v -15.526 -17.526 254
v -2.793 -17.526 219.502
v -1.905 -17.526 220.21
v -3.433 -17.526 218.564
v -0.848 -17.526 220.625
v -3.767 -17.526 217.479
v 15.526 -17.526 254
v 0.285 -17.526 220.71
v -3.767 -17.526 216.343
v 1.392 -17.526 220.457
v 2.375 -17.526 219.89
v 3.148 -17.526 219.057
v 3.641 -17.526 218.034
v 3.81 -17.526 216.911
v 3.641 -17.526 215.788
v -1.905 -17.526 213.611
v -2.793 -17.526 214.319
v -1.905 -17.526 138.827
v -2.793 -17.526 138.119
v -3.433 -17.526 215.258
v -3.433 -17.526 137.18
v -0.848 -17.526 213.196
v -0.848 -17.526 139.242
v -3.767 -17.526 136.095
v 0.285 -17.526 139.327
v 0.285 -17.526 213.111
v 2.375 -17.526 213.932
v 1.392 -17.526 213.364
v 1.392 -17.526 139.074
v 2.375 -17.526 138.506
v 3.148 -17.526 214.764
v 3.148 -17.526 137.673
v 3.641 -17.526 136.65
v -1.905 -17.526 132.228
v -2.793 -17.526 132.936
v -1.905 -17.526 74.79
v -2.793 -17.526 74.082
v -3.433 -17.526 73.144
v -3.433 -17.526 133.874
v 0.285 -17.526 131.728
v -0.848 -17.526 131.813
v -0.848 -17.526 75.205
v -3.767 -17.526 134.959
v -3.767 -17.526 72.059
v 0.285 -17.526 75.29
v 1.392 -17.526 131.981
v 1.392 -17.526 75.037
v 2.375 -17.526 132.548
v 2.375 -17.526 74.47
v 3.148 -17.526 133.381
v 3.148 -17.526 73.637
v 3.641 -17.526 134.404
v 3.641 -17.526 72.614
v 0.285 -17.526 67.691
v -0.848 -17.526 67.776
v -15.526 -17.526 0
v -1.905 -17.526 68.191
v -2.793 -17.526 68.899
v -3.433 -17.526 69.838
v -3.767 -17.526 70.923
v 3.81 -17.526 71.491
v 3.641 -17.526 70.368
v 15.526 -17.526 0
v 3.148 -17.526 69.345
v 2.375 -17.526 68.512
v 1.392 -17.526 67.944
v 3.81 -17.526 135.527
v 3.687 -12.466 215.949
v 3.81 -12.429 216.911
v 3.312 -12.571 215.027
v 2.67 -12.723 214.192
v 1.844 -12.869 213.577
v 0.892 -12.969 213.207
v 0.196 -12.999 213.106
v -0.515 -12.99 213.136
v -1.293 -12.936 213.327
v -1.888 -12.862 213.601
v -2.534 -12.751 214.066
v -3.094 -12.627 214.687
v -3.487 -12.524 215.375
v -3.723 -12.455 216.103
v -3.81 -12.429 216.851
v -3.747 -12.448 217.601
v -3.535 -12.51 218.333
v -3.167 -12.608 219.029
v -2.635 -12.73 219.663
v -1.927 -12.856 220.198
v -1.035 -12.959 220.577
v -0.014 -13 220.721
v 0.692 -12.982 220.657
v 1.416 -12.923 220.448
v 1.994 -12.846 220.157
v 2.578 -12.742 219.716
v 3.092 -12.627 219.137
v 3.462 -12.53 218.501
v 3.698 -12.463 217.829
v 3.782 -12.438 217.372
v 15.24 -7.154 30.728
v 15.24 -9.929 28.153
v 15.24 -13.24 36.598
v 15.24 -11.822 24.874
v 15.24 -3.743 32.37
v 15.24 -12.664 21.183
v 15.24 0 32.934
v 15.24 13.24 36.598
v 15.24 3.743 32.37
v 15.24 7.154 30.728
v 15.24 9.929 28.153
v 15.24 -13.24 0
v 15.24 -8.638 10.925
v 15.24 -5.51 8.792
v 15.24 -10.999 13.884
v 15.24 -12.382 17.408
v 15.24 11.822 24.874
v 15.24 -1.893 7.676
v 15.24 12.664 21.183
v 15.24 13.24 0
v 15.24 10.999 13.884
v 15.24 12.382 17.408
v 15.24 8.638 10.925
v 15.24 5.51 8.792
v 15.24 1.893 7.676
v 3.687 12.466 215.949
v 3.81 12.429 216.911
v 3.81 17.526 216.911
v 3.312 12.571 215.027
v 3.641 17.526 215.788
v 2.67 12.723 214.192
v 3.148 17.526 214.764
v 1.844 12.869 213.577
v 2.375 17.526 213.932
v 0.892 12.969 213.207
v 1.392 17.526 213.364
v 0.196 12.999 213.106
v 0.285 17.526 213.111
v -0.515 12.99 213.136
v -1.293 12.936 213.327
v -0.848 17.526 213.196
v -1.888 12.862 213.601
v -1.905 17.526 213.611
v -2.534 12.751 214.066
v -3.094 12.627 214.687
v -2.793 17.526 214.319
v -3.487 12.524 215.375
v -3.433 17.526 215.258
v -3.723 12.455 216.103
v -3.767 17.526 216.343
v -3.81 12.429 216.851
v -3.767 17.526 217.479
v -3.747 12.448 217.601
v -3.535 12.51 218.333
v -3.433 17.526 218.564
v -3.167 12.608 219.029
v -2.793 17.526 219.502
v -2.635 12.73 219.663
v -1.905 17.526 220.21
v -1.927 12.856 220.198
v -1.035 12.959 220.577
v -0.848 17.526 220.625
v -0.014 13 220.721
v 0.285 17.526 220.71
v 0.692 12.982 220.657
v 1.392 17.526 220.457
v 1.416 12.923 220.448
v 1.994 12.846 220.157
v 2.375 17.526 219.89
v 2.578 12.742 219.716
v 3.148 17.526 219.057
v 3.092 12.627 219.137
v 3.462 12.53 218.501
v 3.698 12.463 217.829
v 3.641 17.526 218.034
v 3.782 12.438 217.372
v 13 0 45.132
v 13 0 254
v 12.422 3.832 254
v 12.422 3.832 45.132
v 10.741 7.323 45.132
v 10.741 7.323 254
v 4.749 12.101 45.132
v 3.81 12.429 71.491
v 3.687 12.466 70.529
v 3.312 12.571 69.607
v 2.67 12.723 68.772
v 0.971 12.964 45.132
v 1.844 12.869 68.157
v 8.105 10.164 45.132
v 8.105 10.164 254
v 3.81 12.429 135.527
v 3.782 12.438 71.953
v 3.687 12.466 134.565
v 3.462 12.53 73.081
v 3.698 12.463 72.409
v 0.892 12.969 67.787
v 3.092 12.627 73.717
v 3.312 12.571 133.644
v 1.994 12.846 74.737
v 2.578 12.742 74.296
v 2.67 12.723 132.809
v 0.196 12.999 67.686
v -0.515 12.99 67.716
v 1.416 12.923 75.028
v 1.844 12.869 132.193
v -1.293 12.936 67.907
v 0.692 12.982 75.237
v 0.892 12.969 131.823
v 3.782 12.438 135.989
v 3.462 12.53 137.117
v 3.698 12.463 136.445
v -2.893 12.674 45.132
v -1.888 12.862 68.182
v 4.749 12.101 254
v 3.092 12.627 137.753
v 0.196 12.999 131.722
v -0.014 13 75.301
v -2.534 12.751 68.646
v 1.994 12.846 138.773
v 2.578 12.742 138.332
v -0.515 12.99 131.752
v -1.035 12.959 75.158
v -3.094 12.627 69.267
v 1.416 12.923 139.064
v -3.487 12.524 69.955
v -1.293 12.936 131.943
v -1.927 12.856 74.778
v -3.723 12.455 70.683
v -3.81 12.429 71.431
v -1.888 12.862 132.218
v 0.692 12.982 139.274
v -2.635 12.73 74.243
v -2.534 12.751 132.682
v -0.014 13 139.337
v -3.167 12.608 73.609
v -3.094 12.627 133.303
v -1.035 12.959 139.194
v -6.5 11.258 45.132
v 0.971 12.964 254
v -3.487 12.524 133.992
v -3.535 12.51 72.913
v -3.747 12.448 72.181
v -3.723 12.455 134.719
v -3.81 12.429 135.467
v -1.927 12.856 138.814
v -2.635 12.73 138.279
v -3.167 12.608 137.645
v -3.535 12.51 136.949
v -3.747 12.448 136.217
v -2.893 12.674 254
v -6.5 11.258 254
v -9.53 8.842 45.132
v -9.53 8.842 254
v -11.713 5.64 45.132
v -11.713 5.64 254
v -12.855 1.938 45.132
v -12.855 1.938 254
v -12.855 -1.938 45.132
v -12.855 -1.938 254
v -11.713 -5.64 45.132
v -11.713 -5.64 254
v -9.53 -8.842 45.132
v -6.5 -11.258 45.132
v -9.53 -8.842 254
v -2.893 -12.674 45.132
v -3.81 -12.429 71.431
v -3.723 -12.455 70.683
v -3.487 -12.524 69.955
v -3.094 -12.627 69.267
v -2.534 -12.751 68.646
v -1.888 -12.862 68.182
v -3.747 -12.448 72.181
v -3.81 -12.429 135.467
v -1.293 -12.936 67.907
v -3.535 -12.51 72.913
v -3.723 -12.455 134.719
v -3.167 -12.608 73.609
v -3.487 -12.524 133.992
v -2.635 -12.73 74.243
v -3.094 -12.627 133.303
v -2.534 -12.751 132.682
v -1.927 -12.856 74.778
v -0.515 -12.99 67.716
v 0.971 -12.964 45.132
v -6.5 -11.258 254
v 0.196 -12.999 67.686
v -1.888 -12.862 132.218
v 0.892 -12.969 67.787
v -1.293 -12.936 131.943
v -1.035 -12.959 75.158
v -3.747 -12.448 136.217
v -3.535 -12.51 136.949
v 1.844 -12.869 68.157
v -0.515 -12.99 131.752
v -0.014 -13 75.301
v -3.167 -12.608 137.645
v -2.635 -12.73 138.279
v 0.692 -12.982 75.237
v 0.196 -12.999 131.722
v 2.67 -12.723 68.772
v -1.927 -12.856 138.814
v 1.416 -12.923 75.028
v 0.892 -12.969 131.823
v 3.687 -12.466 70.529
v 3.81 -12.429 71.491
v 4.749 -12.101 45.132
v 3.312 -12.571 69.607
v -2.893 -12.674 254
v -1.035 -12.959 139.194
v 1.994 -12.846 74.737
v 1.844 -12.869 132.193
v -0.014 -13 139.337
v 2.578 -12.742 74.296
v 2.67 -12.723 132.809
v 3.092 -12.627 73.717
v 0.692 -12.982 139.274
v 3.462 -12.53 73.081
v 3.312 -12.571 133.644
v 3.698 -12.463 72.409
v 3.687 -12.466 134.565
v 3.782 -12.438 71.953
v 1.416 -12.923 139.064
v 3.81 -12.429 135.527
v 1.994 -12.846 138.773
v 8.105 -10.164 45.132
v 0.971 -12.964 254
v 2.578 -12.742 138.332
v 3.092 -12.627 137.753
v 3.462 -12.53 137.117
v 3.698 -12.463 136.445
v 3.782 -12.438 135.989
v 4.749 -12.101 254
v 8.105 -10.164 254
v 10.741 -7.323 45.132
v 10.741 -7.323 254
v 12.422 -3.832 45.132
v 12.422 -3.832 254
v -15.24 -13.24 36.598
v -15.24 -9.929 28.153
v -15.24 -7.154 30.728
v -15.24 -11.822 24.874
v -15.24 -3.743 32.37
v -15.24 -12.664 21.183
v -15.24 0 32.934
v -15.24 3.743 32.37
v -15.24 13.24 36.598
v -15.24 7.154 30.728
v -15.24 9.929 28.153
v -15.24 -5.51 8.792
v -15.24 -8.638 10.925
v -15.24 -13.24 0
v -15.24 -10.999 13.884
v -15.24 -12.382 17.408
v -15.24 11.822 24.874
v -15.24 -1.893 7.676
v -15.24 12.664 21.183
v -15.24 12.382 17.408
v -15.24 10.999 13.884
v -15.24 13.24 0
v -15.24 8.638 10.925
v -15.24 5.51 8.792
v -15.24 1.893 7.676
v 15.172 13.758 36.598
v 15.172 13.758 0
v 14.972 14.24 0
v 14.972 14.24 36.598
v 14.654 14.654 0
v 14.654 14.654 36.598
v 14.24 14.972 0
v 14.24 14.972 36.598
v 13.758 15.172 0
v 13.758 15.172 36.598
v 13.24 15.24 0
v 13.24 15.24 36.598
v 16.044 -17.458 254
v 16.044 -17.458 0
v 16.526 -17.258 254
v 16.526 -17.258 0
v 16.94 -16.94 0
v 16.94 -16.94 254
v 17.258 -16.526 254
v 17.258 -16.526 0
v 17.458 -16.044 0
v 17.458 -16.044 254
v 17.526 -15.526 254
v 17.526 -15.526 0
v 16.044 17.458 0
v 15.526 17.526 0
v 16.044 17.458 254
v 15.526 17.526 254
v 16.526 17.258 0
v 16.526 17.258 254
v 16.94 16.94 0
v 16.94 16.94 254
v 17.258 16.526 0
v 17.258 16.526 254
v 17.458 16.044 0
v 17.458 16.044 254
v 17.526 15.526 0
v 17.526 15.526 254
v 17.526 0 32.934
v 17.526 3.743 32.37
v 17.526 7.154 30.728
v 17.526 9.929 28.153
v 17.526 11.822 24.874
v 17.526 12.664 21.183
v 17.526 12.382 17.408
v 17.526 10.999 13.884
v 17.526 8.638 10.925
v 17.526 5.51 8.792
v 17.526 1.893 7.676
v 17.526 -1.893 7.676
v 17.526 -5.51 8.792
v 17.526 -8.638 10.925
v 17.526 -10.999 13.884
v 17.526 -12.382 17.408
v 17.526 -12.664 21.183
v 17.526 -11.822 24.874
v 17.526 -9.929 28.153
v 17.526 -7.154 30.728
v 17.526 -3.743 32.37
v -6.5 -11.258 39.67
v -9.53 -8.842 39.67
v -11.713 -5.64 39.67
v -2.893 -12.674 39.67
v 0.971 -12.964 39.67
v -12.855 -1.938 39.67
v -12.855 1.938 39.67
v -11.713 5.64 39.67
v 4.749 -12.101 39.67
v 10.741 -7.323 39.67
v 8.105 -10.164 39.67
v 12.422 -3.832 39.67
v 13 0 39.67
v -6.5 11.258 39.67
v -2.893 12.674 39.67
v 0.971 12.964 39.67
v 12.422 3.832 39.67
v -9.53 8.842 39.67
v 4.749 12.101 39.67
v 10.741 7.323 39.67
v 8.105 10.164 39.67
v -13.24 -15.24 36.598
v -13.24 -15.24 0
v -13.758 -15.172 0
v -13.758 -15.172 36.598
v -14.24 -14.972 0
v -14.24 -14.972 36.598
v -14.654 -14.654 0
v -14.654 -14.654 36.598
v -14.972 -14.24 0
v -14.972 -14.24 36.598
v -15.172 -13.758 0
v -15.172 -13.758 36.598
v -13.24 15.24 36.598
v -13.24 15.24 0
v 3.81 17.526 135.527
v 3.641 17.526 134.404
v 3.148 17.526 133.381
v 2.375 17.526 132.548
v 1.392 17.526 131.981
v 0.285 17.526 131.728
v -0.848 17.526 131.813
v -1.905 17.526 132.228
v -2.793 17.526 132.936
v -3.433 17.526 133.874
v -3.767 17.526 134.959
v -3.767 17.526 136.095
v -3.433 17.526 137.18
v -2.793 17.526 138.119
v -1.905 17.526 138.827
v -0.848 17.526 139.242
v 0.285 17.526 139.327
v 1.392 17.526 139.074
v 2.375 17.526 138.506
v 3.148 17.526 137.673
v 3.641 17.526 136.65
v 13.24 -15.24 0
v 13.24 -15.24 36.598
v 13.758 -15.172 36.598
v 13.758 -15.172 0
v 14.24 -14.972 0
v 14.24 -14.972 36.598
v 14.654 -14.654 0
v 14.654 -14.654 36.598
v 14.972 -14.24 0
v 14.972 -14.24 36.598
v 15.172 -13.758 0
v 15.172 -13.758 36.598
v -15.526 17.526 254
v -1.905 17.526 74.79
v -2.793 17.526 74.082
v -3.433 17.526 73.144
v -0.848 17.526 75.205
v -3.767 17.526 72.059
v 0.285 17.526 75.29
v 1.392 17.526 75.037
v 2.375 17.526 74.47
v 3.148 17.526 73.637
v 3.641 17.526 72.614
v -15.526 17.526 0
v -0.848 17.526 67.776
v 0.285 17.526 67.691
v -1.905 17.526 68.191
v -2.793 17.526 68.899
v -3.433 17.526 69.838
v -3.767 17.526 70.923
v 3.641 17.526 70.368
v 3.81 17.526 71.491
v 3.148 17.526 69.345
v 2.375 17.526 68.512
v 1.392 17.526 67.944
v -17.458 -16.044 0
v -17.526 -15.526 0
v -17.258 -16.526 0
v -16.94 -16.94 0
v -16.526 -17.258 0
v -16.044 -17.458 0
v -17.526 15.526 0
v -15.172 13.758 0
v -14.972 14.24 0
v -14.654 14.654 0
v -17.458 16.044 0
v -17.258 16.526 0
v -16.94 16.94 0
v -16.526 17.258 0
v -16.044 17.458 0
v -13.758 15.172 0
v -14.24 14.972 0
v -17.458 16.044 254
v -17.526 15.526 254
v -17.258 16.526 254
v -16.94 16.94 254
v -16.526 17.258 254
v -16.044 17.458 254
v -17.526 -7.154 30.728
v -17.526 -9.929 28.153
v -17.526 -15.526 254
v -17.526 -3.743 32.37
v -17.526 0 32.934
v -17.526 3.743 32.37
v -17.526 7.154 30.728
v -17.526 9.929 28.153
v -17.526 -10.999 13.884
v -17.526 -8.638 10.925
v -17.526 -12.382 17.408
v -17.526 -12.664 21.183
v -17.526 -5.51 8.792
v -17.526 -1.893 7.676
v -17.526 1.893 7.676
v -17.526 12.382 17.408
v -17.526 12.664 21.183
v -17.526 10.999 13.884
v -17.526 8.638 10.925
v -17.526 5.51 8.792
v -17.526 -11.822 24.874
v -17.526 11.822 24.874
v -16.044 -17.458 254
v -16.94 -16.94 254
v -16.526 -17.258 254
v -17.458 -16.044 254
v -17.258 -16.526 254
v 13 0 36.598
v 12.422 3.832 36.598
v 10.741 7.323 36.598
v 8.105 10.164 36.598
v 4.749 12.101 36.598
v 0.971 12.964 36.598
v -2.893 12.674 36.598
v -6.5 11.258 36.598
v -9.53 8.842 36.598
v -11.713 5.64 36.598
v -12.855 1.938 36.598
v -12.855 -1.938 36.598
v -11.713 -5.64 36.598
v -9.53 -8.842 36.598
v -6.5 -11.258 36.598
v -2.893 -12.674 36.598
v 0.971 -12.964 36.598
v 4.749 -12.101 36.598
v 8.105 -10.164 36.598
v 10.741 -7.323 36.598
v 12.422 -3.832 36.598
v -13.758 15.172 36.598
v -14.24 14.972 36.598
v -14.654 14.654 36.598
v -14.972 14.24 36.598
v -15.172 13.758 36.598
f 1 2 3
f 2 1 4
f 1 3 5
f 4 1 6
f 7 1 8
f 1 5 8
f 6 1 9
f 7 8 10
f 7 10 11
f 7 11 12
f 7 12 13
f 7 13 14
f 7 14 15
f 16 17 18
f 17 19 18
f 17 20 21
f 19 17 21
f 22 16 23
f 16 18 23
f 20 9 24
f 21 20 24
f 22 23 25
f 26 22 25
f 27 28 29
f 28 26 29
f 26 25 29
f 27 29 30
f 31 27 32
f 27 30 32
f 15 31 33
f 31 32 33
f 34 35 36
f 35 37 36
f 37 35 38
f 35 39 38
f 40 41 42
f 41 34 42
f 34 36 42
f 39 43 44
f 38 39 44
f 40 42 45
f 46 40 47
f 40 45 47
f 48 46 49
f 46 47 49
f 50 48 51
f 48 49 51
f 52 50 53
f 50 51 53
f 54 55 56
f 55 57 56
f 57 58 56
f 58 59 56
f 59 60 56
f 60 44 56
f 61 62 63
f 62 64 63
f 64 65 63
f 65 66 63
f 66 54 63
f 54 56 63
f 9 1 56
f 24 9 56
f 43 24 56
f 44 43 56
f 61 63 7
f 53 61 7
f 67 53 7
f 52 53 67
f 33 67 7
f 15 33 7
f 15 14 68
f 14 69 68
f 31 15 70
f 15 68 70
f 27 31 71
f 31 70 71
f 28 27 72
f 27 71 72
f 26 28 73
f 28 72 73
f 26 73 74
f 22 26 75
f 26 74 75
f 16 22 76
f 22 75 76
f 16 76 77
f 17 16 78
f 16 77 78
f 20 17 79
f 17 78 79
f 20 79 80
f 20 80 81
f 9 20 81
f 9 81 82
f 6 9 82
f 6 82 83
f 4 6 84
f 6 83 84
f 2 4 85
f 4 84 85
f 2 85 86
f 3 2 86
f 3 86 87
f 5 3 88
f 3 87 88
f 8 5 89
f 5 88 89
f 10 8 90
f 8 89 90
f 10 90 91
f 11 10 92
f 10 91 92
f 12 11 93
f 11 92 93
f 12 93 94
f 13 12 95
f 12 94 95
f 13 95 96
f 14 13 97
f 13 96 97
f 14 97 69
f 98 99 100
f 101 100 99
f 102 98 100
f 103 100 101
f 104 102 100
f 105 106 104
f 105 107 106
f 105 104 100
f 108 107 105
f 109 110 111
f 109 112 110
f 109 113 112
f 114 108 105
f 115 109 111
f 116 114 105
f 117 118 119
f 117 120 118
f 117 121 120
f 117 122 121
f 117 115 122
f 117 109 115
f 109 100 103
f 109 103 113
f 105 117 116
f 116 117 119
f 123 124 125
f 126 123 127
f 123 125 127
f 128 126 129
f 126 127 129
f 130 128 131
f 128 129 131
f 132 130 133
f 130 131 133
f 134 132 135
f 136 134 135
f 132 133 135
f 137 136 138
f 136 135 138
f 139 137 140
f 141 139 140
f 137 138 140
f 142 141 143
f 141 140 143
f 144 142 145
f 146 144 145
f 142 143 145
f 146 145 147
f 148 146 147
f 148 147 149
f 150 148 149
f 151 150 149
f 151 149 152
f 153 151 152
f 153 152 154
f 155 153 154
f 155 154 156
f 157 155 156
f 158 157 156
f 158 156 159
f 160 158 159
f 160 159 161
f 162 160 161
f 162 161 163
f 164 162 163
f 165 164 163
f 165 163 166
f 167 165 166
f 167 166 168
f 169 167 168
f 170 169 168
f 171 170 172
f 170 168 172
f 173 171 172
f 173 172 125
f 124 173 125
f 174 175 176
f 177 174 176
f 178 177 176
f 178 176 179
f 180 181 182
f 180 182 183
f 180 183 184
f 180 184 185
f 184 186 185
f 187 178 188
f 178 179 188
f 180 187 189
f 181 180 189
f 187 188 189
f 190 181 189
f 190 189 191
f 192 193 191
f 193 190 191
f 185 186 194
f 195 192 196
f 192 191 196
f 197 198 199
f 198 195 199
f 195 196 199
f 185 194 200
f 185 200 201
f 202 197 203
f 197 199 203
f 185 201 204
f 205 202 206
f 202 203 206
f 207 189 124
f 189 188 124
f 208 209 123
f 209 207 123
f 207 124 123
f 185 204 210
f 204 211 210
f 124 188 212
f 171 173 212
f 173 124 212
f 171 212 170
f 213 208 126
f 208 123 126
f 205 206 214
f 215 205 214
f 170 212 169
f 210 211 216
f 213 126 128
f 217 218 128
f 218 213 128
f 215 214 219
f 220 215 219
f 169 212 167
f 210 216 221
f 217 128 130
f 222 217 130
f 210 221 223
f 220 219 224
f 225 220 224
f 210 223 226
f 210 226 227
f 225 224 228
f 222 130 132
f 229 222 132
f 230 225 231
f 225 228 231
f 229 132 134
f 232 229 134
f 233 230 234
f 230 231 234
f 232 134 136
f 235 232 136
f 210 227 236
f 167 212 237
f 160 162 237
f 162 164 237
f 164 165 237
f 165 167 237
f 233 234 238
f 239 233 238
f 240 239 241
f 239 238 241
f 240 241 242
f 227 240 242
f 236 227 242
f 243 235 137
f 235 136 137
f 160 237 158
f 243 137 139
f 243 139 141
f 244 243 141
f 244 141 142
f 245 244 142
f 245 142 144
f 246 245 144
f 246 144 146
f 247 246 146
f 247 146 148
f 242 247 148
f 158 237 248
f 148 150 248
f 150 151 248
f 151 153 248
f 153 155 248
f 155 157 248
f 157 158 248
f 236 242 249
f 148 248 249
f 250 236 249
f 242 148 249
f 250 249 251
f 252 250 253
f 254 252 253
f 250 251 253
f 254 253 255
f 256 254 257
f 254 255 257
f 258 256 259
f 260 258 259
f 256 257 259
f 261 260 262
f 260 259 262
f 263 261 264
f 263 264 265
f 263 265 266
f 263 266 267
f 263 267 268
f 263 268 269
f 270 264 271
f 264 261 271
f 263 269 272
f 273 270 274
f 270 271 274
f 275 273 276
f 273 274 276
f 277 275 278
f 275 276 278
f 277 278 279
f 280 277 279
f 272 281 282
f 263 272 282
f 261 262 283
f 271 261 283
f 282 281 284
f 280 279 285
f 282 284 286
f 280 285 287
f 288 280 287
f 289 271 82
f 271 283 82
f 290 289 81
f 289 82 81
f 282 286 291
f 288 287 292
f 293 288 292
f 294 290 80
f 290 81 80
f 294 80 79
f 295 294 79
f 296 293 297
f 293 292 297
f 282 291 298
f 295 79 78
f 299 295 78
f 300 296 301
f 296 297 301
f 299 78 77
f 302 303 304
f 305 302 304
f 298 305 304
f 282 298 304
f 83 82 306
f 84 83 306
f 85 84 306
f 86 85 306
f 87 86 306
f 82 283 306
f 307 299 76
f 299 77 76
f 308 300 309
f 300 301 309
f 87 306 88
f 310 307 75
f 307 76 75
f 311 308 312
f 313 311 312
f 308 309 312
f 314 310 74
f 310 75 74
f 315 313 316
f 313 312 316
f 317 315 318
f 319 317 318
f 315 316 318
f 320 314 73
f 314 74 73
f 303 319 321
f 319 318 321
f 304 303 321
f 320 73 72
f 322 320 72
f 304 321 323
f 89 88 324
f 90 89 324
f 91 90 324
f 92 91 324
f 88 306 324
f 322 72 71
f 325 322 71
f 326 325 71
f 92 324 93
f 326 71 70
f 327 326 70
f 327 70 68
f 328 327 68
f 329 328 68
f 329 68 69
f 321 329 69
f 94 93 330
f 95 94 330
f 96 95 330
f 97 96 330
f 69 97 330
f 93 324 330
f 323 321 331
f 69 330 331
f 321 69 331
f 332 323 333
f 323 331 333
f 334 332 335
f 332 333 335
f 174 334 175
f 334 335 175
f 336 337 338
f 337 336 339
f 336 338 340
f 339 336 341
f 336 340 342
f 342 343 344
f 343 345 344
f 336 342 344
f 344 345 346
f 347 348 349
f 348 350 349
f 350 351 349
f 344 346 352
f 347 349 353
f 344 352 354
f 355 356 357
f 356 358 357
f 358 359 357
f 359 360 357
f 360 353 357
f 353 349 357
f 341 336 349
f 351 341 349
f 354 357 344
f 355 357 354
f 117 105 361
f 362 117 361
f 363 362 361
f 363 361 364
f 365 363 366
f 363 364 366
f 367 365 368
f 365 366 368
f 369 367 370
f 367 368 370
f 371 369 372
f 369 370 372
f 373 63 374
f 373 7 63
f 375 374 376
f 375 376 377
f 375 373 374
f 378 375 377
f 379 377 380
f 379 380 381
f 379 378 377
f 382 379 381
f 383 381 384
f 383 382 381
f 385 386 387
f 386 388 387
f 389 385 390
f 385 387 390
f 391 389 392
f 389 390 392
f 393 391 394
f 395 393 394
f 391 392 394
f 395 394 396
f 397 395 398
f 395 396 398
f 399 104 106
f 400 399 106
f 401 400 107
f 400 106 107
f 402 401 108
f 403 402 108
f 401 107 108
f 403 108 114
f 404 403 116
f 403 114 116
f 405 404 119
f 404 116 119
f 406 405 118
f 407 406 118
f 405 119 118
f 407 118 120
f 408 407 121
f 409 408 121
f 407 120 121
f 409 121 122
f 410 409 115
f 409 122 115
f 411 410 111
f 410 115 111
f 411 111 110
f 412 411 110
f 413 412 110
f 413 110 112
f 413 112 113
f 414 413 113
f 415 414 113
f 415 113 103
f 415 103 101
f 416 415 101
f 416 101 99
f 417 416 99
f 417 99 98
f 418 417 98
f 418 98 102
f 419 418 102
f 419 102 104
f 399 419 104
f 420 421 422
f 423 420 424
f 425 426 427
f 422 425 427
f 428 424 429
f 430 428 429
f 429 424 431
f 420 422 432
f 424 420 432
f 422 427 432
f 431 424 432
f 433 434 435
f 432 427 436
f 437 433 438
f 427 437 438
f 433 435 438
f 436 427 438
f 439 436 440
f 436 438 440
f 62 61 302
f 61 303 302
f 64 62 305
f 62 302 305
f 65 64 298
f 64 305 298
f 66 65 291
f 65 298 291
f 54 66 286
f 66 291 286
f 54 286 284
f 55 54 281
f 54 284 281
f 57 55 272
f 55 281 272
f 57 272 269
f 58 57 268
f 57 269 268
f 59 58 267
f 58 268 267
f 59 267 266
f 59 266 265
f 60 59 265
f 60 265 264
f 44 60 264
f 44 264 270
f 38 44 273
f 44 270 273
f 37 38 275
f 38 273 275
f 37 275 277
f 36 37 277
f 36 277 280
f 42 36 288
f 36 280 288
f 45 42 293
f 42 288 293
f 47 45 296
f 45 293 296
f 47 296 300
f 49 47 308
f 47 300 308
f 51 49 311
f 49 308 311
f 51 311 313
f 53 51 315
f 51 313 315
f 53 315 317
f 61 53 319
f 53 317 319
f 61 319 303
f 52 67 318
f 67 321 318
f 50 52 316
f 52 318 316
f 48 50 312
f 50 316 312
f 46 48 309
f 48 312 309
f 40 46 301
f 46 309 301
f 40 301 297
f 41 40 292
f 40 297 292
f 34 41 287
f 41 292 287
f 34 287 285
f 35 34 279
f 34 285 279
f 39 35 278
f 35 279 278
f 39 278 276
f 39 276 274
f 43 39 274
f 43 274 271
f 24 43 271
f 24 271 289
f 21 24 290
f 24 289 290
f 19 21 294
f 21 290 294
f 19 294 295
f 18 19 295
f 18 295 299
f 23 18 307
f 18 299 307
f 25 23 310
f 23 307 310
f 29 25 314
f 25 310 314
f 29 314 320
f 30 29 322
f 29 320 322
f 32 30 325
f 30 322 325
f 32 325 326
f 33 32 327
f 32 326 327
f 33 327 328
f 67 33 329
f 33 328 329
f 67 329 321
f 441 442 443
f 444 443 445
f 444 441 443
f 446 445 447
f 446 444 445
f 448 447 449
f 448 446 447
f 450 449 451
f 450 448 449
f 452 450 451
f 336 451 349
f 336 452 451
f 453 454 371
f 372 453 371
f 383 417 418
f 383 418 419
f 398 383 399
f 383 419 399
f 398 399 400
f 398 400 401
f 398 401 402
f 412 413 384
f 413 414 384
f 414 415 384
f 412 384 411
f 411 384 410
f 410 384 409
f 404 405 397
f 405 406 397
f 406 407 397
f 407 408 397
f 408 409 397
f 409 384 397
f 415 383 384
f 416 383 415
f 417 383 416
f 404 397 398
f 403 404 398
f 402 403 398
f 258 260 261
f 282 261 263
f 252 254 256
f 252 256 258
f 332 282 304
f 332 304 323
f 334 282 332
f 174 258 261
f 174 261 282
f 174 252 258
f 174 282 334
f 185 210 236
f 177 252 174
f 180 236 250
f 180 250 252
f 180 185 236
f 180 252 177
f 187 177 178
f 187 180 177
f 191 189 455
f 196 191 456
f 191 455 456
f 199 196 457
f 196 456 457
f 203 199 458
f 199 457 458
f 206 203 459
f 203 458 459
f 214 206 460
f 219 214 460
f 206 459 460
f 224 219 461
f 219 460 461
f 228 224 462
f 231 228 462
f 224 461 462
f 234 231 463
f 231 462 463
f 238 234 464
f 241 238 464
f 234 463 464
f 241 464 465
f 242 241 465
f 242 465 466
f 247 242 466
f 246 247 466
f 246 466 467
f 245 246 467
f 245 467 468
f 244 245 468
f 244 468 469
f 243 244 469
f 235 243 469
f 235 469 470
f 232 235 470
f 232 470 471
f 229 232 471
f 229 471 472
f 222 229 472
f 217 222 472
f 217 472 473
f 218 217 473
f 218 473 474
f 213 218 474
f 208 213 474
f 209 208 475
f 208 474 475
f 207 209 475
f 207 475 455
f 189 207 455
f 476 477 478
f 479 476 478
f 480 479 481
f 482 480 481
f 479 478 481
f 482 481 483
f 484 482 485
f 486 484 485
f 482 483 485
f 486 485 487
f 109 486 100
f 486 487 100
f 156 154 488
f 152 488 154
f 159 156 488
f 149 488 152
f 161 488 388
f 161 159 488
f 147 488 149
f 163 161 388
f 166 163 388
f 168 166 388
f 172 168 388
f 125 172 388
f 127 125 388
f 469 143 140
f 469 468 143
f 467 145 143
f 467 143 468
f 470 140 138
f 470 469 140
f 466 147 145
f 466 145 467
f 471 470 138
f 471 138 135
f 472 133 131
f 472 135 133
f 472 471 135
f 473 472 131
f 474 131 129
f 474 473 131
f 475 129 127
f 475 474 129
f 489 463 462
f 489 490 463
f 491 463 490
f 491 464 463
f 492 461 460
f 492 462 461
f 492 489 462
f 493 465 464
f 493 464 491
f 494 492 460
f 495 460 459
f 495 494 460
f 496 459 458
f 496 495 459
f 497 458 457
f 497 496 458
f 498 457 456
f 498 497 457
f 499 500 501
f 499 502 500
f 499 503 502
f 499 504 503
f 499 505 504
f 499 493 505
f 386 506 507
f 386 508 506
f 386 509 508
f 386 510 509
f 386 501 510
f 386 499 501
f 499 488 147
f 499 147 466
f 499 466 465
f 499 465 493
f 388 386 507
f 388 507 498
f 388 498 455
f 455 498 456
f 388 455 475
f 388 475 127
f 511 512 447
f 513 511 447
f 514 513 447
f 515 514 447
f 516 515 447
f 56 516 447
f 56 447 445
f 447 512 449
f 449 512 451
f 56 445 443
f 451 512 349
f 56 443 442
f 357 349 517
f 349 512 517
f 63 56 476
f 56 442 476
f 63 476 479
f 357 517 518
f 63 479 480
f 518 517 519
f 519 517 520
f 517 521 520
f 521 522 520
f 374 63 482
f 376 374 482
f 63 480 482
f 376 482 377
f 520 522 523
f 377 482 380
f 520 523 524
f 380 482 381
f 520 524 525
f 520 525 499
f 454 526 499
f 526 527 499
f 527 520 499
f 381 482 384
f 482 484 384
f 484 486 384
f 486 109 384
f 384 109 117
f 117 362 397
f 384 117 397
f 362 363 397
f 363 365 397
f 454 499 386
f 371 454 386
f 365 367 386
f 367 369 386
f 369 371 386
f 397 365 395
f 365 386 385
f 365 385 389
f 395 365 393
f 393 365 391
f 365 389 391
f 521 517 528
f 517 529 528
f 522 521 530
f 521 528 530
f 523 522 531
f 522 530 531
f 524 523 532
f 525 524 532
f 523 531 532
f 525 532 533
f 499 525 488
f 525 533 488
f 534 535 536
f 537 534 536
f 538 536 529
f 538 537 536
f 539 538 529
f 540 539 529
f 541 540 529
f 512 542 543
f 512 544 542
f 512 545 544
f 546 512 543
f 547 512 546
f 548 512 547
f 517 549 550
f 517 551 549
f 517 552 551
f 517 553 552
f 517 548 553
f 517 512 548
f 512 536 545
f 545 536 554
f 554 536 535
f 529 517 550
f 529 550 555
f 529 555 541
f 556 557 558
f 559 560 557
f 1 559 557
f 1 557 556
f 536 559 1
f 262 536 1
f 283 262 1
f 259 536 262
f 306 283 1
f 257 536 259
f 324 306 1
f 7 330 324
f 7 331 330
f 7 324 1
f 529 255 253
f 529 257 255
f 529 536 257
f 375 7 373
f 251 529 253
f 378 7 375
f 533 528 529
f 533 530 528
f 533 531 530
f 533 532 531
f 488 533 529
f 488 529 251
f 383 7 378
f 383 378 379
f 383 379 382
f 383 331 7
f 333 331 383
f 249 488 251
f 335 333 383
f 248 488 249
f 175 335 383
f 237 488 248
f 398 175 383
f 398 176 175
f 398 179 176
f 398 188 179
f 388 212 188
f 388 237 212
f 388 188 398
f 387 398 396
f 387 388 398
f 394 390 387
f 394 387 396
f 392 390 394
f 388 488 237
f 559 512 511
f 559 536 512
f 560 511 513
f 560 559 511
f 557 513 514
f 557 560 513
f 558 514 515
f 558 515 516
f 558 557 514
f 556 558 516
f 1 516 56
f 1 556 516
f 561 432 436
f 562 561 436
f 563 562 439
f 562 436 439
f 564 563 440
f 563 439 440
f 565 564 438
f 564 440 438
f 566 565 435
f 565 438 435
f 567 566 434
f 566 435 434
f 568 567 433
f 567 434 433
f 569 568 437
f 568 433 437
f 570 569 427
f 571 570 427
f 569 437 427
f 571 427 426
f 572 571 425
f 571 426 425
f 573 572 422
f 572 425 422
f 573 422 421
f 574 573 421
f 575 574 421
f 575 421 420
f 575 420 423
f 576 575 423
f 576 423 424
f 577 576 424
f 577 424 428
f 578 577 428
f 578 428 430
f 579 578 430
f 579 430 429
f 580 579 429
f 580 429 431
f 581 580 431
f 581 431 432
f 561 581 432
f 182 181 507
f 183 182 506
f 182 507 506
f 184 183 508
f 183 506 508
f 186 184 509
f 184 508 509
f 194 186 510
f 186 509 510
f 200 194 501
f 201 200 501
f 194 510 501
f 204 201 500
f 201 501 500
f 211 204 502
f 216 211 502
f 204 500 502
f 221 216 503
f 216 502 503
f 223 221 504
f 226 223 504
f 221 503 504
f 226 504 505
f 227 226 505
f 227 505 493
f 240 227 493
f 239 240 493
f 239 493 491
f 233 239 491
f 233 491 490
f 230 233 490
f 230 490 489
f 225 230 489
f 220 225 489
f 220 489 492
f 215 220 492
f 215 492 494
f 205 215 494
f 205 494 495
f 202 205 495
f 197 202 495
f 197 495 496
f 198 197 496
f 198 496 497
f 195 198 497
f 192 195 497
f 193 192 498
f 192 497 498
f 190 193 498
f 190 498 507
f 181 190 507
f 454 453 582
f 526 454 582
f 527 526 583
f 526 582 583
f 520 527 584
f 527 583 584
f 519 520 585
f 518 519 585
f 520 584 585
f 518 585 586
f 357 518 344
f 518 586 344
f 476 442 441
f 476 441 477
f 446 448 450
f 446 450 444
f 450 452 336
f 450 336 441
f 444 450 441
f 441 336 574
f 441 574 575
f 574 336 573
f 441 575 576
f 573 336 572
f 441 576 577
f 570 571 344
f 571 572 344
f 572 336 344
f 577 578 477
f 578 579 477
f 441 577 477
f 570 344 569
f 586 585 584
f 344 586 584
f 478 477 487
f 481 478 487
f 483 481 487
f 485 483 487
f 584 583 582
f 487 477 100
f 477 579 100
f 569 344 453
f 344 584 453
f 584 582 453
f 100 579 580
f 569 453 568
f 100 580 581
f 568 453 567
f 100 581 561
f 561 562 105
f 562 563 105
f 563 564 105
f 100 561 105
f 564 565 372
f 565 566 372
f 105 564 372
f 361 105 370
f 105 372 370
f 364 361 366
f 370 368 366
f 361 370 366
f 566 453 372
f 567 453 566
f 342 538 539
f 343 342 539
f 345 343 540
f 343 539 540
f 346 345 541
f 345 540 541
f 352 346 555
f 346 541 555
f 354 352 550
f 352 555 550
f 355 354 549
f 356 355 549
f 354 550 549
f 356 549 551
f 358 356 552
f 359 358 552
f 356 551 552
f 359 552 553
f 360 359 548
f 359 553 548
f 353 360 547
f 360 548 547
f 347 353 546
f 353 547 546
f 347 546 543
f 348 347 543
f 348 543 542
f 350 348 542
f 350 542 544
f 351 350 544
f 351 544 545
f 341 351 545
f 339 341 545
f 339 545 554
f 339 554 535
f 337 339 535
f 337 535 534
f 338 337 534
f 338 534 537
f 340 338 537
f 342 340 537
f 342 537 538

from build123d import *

# Parameters (mm, degrees)
SKETCH1_W           = 35.052
SKETCH1_H           = 35.052
SKETCH1_W_2         = 30.48
SKETCH1_H_2         = 30.48
BOSS_EXTRUDE1_DEPTH = 254
FILLET1_R           = 2
FILLET2_R           = 2
SKETCH2_R           = 12.7
CUT_EXTRUDE1_DEPTH  = 254
SKETCH3_R           = 3.81
CUT_EXTRUDE2_DEPTH  = 254
BOSS_EXTRUDE3_REACH = 37.052
SKETCH4_W           = 31.052
SKETCH4_H           = 5.462350323
SKETCH6_W           = 30.48
SKETCH6_H           = 30.48
SKETCH6_R           = 13
BOSS_EXTRUDE4_DEPTH = 217.402
SKETCH7_R           = 3.81
CUT_EXTRUDE3_DEPTH  = 217.402


with BuildPart() as part:
    # Sketch1 → Boss-Extrude1 (new body)
    with BuildSketch(Plane.XY):
        Rectangle(SKETCH1_W, SKETCH1_H)
        Rectangle(SKETCH1_W_2, SKETCH1_H_2, mode=Mode.SUBTRACT)
    extrude(amount=BOSS_EXTRUDE1_DEPTH)

    # Fillet1
    fillet1_edges = [part.edges().sort_by_distance(p)[0] for p in [
        (17.526, -17.526, 127),
        (-17.526, -17.526, 127),
        (-17.526, 17.526, 127),
        (17.526, 17.526, 127),
    ]]
    fillet(fillet1_edges, radius=FILLET1_R)

    # Fillet2
    fillet2_edges = [part.edges().sort_by_distance(p)[0] for p in [
        (15.24, -15.24, 127),
        (15.24, 15.24, 127),
        (-15.24, 15.24, 127),
        (-15.24, -15.24, 127),
    ]]
    fillet(fillet2_edges, radius=FILLET2_R)

    # Sketch2 → Cut-Extrude1 (cut)
    with BuildSketch(Plane.ZY.offset(17.526)):
        with Locations((20.234414068, 0)):
            Circle(SKETCH2_R)
    extrude(amount=-CUT_EXTRUDE1_DEPTH, mode=Mode.SUBTRACT)

    # Sketch3 → Cut-Extrude2 (cut)
    with BuildSketch(Plane(origin=(0, 17.526, 0), x_dir=(1, 0, 0), z_dir=(0, 1, 0))):
        with Locations((0, -135.527156181)):
            Circle(SKETCH3_R)
        with Locations((0, -216.910746369)):
            Circle(SKETCH3_R)
        with Locations((0, -71.490837775)):
            Circle(SKETCH3_R)
    extrude(amount=-CUT_EXTRUDE2_DEPTH, mode=Mode.SUBTRACT)

    # Sketch4 → Boss-Extrude3 (add, up to next)
    with BuildSketch(Plane(origin=(0, 17.526, 0), x_dir=(1, 0, 0), z_dir=(0, 1, 0)), mode=Mode.PRIVATE) as boss_extrude3_sk1:
        with Locations((0, -42.400785955)):
            Rectangle(SKETCH4_W, SKETCH4_H)
    boss_extrude3_tool1 = extrude(boss_extrude3_sk1.sketch, amount=-BOSS_EXTRUDE3_REACH, mode=Mode.PRIVATE) - part.part
    add(boss_extrude3_tool1.solids().sort_by_distance((0, 17.526, 42.400786))[0])

    # Sketch6 → Boss-Extrude4 (add)
    with BuildSketch(Plane.XY.offset(254)):
        Rectangle(SKETCH6_W, SKETCH6_H)
        Circle(SKETCH6_R, mode=Mode.SUBTRACT)
    extrude(amount=-BOSS_EXTRUDE4_DEPTH)

    # Sketch7 → Cut-Extrude3 (cut)
    with BuildSketch(Plane(origin=(0, 17.526, 0), x_dir=(1, 0, 0), z_dir=(0, 1, 0))):
        with Locations((0, -71.490837775)):
            Circle(SKETCH7_R)
        with Locations((0, -135.527156181)):
            Circle(SKETCH7_R)
        with Locations((0, -216.910746369)):
            Circle(SKETCH7_R)
    extrude(amount=-CUT_EXTRUDE3_DEPTH, mode=Mode.SUBTRACT)


solid = part.part
